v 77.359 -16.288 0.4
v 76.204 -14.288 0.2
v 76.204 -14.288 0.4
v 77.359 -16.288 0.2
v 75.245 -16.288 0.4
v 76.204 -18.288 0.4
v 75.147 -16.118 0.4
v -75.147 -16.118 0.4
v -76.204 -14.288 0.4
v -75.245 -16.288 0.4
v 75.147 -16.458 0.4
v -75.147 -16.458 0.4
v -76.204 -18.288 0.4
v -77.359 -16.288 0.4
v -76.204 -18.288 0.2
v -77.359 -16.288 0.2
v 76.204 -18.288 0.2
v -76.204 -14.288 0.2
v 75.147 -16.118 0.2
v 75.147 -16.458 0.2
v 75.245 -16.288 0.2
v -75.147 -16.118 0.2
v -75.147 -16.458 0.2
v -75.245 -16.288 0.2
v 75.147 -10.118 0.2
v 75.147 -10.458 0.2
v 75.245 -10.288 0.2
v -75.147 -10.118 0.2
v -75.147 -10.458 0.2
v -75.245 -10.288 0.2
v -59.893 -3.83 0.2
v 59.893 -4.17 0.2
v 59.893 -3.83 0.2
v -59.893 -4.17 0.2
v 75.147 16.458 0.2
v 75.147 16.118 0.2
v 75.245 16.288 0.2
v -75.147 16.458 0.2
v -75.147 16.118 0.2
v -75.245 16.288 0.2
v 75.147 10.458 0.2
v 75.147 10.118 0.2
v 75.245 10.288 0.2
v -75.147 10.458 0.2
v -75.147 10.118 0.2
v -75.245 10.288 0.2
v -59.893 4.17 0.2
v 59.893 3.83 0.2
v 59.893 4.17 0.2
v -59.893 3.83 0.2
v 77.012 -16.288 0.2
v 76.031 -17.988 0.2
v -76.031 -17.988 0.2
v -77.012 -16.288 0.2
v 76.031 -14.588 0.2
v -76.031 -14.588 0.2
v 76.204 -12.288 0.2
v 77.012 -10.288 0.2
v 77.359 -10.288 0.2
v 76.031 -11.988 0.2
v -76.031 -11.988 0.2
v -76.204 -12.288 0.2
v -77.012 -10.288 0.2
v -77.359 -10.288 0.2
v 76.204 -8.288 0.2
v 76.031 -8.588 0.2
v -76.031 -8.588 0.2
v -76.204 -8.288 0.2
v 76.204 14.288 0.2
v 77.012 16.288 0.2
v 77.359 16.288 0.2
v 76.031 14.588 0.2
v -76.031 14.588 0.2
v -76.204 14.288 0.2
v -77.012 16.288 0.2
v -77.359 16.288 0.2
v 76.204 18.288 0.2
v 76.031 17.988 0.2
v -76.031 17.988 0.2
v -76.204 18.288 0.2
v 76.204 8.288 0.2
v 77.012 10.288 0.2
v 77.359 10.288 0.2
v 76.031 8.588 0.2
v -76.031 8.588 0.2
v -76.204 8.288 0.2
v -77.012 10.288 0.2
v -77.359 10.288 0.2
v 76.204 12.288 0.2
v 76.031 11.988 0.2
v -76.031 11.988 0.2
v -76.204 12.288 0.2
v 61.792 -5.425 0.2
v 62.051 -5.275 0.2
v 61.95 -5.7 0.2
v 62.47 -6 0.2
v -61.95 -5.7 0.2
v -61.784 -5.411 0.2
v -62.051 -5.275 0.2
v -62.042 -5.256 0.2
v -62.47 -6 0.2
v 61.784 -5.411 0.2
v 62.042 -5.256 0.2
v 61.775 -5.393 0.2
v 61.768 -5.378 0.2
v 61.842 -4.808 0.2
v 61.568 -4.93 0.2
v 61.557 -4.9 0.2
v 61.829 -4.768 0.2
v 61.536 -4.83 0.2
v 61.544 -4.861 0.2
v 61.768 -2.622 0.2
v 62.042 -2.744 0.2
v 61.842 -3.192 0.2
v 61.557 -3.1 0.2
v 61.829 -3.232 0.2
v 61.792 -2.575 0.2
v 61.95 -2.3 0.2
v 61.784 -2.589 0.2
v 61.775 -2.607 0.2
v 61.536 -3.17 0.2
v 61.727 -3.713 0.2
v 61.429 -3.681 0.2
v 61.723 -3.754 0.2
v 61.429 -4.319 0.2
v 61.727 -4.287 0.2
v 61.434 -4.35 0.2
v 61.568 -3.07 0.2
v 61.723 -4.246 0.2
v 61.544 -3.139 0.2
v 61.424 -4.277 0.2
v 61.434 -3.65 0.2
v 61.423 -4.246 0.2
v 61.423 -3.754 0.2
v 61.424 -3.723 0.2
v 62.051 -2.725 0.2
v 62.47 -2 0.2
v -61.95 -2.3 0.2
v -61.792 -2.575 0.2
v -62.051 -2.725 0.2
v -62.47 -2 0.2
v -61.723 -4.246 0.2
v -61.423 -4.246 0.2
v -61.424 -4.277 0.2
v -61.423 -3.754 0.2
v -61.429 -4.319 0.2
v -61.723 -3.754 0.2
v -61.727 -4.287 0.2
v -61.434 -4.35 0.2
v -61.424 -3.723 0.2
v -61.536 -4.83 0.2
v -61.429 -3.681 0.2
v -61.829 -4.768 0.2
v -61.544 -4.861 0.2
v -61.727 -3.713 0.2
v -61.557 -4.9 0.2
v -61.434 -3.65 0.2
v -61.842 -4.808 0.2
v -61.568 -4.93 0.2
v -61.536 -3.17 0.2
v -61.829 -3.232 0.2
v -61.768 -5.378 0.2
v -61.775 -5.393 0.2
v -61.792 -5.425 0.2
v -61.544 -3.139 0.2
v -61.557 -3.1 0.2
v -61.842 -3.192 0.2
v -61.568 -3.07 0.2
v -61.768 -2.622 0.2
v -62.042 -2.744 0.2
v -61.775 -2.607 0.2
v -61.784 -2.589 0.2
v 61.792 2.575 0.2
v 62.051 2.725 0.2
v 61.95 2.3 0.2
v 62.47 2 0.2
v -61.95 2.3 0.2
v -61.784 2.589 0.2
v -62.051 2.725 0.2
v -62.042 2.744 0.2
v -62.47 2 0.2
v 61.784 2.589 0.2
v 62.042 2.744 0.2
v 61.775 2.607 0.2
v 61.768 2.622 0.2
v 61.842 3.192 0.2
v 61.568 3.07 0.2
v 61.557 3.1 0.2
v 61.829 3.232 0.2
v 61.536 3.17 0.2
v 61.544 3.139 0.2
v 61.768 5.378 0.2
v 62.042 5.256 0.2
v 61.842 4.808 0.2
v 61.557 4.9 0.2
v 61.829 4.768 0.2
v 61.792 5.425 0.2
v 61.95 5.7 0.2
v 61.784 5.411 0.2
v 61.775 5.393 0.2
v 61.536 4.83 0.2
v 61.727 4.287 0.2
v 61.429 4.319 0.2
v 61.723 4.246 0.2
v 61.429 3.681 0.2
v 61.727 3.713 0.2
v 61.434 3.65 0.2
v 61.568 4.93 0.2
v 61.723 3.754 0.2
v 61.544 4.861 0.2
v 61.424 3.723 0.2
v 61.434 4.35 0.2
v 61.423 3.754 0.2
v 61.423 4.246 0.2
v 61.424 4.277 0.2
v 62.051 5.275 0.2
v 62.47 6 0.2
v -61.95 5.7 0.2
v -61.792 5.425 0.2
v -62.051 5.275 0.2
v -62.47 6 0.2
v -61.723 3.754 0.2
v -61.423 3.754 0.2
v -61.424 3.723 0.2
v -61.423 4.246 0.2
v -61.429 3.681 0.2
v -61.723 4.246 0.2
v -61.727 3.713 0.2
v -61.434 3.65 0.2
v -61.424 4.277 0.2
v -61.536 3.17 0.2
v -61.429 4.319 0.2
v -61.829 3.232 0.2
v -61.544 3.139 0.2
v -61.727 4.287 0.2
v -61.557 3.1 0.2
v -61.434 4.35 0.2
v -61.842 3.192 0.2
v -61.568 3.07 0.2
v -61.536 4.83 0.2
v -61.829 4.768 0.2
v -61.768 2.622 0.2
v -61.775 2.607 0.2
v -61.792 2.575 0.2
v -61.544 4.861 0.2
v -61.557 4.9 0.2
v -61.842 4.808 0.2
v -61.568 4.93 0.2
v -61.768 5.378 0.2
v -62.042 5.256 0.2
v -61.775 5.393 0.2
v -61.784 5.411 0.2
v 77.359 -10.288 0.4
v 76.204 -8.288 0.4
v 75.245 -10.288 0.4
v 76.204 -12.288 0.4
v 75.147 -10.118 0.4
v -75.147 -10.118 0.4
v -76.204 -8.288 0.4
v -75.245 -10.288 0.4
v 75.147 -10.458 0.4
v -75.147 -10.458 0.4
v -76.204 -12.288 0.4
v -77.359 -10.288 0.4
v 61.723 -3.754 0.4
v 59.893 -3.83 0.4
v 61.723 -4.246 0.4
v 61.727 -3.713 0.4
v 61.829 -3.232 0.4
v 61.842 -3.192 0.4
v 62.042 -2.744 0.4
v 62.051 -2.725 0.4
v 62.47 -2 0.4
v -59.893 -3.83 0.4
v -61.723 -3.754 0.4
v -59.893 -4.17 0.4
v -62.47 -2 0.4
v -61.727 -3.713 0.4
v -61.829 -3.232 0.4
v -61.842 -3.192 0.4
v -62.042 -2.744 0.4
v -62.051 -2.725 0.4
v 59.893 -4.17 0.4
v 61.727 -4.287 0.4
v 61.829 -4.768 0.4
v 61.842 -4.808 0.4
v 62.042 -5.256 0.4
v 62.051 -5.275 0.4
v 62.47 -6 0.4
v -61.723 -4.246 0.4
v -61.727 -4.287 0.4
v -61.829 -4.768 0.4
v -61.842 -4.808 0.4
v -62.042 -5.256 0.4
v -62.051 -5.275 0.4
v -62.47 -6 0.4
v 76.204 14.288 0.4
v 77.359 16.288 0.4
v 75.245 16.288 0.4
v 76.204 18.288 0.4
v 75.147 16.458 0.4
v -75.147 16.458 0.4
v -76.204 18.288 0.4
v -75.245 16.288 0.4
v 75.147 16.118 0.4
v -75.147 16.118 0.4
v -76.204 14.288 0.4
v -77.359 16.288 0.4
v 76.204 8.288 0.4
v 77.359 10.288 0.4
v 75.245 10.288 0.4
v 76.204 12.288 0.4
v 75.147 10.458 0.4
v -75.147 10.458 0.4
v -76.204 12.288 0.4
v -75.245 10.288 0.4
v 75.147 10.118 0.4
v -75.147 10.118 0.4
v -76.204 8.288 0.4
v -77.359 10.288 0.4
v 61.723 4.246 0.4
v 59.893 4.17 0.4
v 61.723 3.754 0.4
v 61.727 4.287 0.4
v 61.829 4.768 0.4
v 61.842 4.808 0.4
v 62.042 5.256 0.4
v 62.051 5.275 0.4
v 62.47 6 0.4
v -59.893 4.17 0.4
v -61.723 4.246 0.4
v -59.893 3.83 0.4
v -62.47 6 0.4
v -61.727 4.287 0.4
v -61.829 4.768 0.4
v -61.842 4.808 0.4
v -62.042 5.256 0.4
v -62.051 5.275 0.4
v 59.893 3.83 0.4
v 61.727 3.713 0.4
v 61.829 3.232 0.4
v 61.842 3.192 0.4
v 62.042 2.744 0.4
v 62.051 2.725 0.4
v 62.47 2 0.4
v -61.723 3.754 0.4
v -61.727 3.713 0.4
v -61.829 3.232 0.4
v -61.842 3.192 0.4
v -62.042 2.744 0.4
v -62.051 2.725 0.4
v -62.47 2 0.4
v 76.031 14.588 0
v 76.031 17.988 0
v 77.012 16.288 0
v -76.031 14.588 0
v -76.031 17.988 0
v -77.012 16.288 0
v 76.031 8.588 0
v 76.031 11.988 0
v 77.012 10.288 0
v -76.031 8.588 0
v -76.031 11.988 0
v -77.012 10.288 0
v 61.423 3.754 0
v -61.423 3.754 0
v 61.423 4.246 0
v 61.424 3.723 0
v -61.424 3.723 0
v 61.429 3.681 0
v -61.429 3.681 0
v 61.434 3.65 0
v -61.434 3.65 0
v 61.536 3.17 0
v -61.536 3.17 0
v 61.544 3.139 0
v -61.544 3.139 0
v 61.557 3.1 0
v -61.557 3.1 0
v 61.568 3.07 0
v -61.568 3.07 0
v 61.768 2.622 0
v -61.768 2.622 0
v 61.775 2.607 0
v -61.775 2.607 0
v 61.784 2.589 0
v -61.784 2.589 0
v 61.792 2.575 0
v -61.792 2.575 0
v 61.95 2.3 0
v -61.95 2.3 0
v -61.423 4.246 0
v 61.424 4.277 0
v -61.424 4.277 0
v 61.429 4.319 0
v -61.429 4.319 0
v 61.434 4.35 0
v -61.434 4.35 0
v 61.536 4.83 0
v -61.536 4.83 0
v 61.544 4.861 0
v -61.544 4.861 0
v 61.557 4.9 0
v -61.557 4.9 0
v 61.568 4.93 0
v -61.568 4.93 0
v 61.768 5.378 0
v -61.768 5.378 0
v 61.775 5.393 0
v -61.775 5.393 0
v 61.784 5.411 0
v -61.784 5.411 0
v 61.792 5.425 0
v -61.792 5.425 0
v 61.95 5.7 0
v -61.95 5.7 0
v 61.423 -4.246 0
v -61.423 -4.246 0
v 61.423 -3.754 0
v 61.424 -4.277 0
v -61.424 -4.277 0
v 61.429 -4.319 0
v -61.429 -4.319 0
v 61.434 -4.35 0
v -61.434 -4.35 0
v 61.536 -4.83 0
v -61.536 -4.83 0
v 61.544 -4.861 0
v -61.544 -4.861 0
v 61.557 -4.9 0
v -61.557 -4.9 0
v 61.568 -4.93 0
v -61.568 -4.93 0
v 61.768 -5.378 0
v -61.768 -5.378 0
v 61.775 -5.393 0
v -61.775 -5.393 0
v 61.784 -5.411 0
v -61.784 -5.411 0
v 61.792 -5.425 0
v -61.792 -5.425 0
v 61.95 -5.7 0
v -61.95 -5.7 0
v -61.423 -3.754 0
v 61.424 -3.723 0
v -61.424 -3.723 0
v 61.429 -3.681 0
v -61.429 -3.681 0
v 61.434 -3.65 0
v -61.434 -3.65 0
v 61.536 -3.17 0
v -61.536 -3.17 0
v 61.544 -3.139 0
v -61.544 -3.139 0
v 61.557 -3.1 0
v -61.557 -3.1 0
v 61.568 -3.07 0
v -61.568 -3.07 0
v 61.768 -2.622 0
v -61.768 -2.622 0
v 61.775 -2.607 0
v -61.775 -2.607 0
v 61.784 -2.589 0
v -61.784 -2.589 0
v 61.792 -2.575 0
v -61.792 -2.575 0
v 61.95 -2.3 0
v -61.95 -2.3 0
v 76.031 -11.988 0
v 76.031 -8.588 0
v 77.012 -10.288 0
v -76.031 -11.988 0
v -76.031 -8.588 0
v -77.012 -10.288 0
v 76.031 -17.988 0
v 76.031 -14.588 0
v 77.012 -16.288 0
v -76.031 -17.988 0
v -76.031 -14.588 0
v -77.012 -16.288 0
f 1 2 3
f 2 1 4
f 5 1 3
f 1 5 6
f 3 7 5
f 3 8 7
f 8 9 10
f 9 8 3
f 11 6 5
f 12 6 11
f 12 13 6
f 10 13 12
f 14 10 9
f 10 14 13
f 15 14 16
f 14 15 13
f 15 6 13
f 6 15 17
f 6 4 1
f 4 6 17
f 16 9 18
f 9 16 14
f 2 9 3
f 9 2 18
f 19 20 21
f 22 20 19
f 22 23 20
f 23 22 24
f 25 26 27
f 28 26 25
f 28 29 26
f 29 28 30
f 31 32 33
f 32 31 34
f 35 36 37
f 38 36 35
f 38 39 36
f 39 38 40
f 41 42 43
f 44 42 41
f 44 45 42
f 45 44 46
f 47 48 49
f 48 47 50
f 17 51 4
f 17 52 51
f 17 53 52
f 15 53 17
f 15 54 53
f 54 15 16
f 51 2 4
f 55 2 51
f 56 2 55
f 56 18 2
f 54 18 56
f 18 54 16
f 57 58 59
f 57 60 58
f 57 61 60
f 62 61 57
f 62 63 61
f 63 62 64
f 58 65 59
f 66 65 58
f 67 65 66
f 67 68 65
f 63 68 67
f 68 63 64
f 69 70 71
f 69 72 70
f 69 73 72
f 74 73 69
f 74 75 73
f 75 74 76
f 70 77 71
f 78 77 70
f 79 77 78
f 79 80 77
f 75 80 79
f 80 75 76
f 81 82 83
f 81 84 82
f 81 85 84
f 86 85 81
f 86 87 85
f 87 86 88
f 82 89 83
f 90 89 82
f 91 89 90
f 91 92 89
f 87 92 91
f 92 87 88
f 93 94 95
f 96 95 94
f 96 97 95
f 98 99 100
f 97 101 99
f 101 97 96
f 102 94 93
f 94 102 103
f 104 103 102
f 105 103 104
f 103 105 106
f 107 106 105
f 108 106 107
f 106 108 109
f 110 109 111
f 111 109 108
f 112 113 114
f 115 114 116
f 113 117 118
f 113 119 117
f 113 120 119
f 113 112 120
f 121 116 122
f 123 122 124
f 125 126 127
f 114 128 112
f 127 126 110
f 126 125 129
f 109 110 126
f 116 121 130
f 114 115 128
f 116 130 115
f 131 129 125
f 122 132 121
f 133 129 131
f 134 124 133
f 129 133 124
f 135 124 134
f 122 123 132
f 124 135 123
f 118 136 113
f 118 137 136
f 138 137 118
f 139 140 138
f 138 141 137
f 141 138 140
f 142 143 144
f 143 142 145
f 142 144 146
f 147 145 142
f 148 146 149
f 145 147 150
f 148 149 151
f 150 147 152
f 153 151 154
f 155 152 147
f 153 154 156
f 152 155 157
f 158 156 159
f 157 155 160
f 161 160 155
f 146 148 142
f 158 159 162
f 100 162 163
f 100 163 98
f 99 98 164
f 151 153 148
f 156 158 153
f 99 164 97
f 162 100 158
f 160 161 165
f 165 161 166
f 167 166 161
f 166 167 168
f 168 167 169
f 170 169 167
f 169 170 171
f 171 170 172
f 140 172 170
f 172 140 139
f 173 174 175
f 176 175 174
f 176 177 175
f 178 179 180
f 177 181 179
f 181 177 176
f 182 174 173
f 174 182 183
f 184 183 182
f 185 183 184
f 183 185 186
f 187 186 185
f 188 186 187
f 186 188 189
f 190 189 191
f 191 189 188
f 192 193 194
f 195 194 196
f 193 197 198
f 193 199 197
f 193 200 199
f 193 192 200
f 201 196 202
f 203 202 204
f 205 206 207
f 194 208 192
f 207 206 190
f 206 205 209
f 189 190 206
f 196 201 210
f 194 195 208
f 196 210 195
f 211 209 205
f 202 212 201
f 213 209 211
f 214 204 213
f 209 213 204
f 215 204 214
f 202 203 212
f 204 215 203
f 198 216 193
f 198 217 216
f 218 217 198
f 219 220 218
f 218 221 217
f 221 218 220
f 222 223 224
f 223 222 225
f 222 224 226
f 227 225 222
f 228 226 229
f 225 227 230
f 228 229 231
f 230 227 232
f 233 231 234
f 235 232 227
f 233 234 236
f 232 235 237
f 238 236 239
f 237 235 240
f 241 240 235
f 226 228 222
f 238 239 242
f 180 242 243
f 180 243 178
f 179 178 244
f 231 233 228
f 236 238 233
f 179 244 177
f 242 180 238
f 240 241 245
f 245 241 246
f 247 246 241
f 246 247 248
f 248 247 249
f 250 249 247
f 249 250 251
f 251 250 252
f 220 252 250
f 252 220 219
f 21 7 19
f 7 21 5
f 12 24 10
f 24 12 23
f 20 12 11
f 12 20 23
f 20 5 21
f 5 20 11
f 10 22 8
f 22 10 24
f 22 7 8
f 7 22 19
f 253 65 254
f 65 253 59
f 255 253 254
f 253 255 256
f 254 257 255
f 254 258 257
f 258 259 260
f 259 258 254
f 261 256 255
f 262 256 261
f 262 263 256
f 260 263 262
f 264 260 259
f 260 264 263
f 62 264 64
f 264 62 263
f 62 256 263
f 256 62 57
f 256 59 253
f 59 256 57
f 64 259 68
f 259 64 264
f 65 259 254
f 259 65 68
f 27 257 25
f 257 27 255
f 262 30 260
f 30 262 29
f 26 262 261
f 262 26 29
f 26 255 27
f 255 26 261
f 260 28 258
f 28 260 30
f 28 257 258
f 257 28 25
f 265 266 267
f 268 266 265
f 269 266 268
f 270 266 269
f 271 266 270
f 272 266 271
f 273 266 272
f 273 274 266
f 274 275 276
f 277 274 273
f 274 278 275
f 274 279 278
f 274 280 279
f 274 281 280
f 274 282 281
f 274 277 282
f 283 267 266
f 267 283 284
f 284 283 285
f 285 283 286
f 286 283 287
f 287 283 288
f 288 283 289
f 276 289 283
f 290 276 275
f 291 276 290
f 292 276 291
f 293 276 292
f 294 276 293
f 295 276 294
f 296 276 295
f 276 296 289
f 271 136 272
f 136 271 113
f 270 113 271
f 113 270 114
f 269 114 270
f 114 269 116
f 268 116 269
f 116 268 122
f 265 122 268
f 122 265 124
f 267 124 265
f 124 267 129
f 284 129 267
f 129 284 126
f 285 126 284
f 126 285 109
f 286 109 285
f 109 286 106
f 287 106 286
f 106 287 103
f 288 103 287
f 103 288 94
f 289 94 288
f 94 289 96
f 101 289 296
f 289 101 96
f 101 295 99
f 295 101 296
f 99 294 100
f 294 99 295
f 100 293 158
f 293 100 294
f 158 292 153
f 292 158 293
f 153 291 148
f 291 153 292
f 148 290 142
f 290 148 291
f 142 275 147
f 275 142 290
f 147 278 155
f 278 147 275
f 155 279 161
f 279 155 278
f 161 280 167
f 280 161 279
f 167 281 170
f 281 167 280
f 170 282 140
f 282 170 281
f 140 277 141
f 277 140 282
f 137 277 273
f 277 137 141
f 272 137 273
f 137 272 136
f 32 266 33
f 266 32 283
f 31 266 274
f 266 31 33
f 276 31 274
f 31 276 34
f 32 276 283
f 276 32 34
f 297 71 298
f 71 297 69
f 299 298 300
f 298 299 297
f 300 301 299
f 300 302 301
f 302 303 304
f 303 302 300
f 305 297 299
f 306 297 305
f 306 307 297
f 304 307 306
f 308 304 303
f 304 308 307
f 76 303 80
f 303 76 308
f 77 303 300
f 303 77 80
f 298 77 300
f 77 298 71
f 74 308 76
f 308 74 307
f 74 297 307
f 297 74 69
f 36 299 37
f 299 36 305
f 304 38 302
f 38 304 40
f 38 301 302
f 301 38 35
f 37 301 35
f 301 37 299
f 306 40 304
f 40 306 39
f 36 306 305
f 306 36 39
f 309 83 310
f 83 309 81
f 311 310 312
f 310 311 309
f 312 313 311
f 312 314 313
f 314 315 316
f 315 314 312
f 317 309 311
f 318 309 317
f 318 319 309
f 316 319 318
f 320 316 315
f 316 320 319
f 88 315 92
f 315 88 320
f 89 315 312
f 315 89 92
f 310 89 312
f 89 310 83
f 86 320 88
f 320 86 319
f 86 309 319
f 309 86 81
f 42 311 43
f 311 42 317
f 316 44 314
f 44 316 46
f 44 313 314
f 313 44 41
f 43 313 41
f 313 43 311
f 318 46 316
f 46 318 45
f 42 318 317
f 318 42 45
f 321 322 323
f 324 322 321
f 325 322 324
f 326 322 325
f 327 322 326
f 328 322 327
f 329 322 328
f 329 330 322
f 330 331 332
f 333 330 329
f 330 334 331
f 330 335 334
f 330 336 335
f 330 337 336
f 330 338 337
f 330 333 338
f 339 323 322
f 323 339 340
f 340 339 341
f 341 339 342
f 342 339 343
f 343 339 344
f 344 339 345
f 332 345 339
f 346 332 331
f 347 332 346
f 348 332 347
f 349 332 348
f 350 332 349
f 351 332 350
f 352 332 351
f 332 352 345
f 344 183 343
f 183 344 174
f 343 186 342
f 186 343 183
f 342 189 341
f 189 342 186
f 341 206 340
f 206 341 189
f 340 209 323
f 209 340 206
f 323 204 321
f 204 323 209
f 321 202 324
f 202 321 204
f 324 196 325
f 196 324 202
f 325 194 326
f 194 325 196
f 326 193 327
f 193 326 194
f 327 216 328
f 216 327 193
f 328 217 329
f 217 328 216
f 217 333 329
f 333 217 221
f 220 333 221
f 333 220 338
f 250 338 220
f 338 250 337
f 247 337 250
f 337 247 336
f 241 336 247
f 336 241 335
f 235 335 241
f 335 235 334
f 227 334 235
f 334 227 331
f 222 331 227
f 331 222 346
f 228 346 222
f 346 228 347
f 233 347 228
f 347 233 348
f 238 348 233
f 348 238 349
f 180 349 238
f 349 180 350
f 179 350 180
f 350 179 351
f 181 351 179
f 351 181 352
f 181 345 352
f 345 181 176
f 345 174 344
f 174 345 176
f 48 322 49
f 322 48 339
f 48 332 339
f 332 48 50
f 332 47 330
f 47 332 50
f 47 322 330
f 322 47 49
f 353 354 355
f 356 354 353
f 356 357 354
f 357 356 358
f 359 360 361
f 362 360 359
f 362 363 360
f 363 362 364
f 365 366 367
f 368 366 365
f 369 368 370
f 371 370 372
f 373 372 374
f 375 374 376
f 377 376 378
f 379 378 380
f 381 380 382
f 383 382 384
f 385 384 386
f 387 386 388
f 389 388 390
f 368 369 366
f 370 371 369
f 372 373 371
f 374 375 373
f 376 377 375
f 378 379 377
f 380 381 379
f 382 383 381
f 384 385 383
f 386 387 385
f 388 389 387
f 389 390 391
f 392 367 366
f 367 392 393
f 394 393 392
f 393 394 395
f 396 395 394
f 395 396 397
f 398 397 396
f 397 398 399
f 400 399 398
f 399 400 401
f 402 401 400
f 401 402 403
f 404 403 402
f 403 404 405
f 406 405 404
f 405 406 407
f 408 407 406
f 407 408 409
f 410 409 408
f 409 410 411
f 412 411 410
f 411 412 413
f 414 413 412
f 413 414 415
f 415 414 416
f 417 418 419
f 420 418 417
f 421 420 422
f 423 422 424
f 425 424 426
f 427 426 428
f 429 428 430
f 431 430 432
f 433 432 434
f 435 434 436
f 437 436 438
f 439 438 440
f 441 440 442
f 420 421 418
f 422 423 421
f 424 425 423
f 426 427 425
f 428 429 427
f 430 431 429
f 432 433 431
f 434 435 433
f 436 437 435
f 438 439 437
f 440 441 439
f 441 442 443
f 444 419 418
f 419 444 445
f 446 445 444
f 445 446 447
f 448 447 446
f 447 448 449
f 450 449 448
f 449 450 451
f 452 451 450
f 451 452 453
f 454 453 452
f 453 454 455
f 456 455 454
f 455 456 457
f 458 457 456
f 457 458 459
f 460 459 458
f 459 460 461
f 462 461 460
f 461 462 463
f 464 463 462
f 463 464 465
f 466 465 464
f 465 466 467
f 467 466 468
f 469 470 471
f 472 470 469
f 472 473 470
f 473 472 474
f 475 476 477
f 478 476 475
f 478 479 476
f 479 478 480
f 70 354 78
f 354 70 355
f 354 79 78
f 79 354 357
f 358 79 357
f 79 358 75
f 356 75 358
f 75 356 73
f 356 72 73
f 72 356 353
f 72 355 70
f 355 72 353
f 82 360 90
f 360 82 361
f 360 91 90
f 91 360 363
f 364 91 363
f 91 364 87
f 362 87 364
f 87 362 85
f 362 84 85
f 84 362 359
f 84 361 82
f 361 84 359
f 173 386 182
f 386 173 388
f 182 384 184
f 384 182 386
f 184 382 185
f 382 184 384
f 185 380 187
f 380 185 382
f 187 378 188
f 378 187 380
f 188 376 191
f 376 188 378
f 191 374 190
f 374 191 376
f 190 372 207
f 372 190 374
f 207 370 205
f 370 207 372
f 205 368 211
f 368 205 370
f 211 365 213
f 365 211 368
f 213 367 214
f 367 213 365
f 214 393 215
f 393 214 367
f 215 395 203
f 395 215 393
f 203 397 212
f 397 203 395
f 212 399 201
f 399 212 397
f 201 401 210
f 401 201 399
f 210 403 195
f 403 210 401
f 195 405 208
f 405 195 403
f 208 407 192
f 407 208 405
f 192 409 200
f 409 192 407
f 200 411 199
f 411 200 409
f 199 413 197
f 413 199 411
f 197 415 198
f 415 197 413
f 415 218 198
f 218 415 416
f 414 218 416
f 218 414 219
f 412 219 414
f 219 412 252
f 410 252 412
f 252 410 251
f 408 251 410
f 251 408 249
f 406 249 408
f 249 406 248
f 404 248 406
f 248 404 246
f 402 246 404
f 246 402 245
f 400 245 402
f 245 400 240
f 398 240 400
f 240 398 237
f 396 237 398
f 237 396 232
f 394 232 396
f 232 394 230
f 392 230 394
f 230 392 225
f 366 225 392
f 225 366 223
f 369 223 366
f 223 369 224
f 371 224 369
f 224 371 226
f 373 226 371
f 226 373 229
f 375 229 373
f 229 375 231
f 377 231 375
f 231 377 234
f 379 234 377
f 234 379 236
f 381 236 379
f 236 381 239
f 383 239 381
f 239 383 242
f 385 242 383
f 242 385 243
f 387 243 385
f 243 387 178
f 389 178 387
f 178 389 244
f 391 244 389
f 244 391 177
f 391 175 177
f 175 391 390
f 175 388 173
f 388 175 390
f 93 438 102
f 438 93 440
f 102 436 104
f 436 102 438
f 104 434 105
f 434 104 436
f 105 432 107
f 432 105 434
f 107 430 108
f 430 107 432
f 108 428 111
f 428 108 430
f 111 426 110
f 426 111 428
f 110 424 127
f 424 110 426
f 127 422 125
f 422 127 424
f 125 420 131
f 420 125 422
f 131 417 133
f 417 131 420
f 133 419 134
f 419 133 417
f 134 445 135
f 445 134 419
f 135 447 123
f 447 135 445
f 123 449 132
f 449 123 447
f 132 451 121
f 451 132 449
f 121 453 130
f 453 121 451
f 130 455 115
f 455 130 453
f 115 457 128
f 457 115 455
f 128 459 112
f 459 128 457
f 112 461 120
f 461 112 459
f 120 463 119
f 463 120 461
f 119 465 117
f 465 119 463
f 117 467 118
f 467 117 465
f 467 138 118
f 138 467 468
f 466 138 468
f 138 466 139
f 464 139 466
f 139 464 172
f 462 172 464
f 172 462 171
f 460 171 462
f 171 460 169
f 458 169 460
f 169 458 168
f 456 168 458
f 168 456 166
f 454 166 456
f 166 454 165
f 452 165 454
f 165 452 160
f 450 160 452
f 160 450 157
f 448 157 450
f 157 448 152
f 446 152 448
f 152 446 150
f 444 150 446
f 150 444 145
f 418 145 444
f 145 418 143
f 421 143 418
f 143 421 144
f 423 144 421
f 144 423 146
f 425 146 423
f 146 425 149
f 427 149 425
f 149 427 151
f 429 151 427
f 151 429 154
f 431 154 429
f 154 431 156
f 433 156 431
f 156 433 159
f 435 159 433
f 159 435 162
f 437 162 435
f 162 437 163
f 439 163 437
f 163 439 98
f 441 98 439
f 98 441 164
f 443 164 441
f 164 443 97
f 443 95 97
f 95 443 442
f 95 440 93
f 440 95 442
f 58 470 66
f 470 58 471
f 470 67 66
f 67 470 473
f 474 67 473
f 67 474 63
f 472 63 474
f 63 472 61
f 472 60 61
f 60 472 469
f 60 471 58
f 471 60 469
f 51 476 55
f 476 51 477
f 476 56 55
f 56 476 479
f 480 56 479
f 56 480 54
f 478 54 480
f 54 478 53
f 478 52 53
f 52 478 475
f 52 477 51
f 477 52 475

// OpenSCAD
eps = 0.0001;
$fn = 16;

hex_side = 32;
thickness = 2.4;

clasp_width = 5;
clasp_length = 2.7;
slack = 0.15;

ears = true;
ear_thickness = 0.4 - eps;

stripe_thickness = 0.4;
stripe_width = 4.4;
stripe_inset = 2.2;

prototype = false;

function contains_mod_6(haystack, needle, pos=0) =
  (pos < len(haystack))
  && (
    ((needle % 6) == (haystack[pos] % 6))
    || contains_mod_6(haystack, needle, pos+1)
  );

module hex_2d() {
  polygon([for (r = [0:60:300]) hex_side * [cos(r), sin(r)]]);
}

module long_stripe_2d() {
  $fn = 30;

  intersection() {
    translate([0, spacing/2])
      square([1000, stripe_width], center=true);
    
    offset(-stripe_inset)
      hull()
        for (a = [60, 300])
          rotate([0, 0, a])
            translate([0, spacing])
              hex_2d();
  }
}

module short_stripe_2d() {
  $fn = 30;
  
  intersection() {
    square([1000, stripe_width], center=true);
    
    offset(-stripe_inset - slack - eps) {
      offset(slack + eps) {
        hex_2d();
        for (b = [60, 120, 240, 300])
          rotate([0, 0, b])
            translate([0, spacing])
              hex_2d();
      }
    }
  }
}

module clasp_lug_2d() {
  translate([0, hex_side*sqrt(3)/2])
    square([clasp_width, clasp_length]);
}

module clasp_socket_2d() {
  offset(slack)
    translate([-clasp_width, hex_side*sqrt(3)/2 - clasp_length])
      square([clasp_width, 2*clasp_length]);
}

module piece_2d(lugs=[]) {
  difference() {
    union() {
      hex_2d();
      
      for (r = 60 * lugs)
        rotate([0, 0, r])
          clasp_lug_2d();
    }
    
    for (r = 60 * lugs)
      rotate([0, 0, r])
        clasp_socket_2d();
    
    if (prototype)
      circle(hex_side*0.55, $fn=40);
  }
}

groove_depth = 1;
groove_flat = 0.15;

module groove() {
  magnitude = groove_depth * sqrt(2);
  
  hull()
    for (dy = groove_flat * [-1, 1])
      translate([0, hex_side*sqrt(3)/2 + dy, thickness])
        scale([1, 0.75, 1])
          rotate([45, 0, 0])
            cube([hex_side+1, magnitude, magnitude], center=true);
}

spacing = hex_side * sqrt(3) + slack;

module joint() {
  // Withdraw the ends slightly from exposed inner corners.
  width = hex_side - 0.3;
  
  color("red")
    linear_extrude(thickness - groove_depth)
      translate([-width/2, hex_side * sqrt(3) / 2 - 0.1])
        square([width, 0.2 + slack]);
}

module plug() {
  color("blue")
    linear_extrude(thickness - groove_depth)
      translate([hex_side, 0])
        square(2, center=true);
}

module piece(lugs=[], joints=[]) {
  difference() {
    linear_extrude(thickness)
      piece_2d(lugs=lugs);
    
    for (a = [0:60:300])
      rotate([0, 0, a])
        groove();
  }

  // Rabbit ears for lugs.
  if (ears)
    linear_extrude(ear_thickness)
      for (r = 60 * lugs)
        rotate([0, 0, r])
          translate([0.3, hex_side * sqrt(3)/2 + clasp_length - 1])
            square([clasp_width-0.5, 10]);
  
  // Joints.
  for (r = 60 * joints)
    rotate([0, 0, r])
      joint();
  
  // Plugs wherever two joints meet.
  for (a = [0:5])
    if (contains_mod_6(joints, a) && contains_mod_6(joints, a+1))
      rotate([0, 0, 120 + a*60])
        plug();
    
  // Rabbit ears at exposed corners.
  if (ears)
    linear_extrude(ear_thickness)
      for (a = [0:5])
        if (!contains_mod_6(joints, a) && !contains_mod_6(joints, a+1))
          rotate([0, 0, 120 + a*60])
            translate([hex_side, 0])
              rotate([0, 0, 30])
                translate([-1, 0.2])
                  square([10, 5]);
}

module small_piece(lugs=[true, true, true, true], stripe=true) {
  difference() {
    union() {
      piece(joints=[0, 1, 2, 3, 4, 5]);
      
      for (a = [0:5]) {
        rotate([0, 0, a*60]) {
          translate([0, spacing])
            piece(
              lugs =
                (a == 0 && lugs[0]) ? [1, 5]
              : (a == 1 && lugs[1]) ? [1]
              : (a == 2 && lugs[1]) ? [5]
              : (a == 3 && lugs[2]) ? [1, 5]
              : (a == 4 && lugs[3]) ? [1]
              : (a == 5 && lugs[3]) ? [5]
              : [],
              joints=[2, 3, 4]
            );
        }
      }

      if (stripe)
        linear_extrude(thickness)
          offset(-0.2)
            long_stripe_2d();
    }
    
    if (stripe)
      translate([0, 0, thickness - stripe_thickness])
        linear_extrude(10)
          long_stripe_2d();
  }
}

module large_piece(lugs=[true, true, true, true], stripe=true) {
  difference() {
    union() {
      // Short row.
      for (a = [0:1])
        translate([0, a * spacing])
          piece(
            joints =
              (a == 0) ? [0, 1, 2,    4, 5]
            : (a == 1) ? [   1, 2, 3, 4, 5]
            : []
          );
      
      // Long rows.
      for (a = [-1, 0, 1], b = [-1, 1])
        translate([0, a * spacing])
          rotate([0, 0, b * 60])
            translate([0, spacing])
              piece(
                lugs =
                  (b == -1 && a == -1 && lugs[0]) ? [3]
                : (b ==  1 && a == -1 && lugs[0]) ? [3]
                : (b == -1 && a ==  1 && lugs[1]) ? [2]
                : (b ==  1 && a ==  1 && lugs[1]) ? [4]
                : (b == -1 && a ==  0 && lugs[2]) ? [0, 5]
                : (b ==  1 && a ==  0 && lugs[3]) ? [0, 1]
                : [],
                joints =
                  (b == -1 && a == -1) ? [1, 2]
                : (b ==  1 && a == -1) ? [4, 5]
                : (b == -1 && a ==  1) ? [3, 4]
                : (b ==  1 && a ==  1) ? [2, 3]
                : (b == -1 && a ==  0) ? [1, 3, 4]
                : (b ==  1 && a ==  0) ? [2, 4, 5]
                : []
              );
              
      if (stripe)
        linear_extrude(thickness)
          offset(-0.2)
            short_stripe_2d();
    }
    
    if (stripe)
      translate([0, 0, thickness - stripe_thickness])
        linear_extrude(10)
          short_stripe_2d();
  }
}

module print() {
  linear_extrude(0.2)
    offset(-0.3)
      projection(cut=true)
        translate([0, 0, -0.1])
          children();
  intersection() {
    children();
    translate([0, 0, 500.2])
      cube(1000, center=true);
  }
}

module gash() {
  translate([0, 0, 0.2])
    linear_extrude(1)
        offset(0.17 - stripe_width/2)
          children();
}

module print_stripes() {
  print() {
    for (a = [-1, 1]) {
      scale([1, a]) {
        translate([0, -11.5]) {
          for (y = [0, -6]) {
            translate([0, y]) {
              difference() {
                linear_extrude(stripe_thickness)
                  offset(-0.2)
                    long_stripe_2d();
                gash()
                  long_stripe_2d();
              }
            }
          }
          
          translate([0, 15.5]) {
            difference() {
              linear_extrude(stripe_thickness)
                offset(-0.2)
                  short_stripe_2d();
              gash()
                short_stripe_2d();
            }
          }
        }
      }
    }
  }
}

print_stripes();
